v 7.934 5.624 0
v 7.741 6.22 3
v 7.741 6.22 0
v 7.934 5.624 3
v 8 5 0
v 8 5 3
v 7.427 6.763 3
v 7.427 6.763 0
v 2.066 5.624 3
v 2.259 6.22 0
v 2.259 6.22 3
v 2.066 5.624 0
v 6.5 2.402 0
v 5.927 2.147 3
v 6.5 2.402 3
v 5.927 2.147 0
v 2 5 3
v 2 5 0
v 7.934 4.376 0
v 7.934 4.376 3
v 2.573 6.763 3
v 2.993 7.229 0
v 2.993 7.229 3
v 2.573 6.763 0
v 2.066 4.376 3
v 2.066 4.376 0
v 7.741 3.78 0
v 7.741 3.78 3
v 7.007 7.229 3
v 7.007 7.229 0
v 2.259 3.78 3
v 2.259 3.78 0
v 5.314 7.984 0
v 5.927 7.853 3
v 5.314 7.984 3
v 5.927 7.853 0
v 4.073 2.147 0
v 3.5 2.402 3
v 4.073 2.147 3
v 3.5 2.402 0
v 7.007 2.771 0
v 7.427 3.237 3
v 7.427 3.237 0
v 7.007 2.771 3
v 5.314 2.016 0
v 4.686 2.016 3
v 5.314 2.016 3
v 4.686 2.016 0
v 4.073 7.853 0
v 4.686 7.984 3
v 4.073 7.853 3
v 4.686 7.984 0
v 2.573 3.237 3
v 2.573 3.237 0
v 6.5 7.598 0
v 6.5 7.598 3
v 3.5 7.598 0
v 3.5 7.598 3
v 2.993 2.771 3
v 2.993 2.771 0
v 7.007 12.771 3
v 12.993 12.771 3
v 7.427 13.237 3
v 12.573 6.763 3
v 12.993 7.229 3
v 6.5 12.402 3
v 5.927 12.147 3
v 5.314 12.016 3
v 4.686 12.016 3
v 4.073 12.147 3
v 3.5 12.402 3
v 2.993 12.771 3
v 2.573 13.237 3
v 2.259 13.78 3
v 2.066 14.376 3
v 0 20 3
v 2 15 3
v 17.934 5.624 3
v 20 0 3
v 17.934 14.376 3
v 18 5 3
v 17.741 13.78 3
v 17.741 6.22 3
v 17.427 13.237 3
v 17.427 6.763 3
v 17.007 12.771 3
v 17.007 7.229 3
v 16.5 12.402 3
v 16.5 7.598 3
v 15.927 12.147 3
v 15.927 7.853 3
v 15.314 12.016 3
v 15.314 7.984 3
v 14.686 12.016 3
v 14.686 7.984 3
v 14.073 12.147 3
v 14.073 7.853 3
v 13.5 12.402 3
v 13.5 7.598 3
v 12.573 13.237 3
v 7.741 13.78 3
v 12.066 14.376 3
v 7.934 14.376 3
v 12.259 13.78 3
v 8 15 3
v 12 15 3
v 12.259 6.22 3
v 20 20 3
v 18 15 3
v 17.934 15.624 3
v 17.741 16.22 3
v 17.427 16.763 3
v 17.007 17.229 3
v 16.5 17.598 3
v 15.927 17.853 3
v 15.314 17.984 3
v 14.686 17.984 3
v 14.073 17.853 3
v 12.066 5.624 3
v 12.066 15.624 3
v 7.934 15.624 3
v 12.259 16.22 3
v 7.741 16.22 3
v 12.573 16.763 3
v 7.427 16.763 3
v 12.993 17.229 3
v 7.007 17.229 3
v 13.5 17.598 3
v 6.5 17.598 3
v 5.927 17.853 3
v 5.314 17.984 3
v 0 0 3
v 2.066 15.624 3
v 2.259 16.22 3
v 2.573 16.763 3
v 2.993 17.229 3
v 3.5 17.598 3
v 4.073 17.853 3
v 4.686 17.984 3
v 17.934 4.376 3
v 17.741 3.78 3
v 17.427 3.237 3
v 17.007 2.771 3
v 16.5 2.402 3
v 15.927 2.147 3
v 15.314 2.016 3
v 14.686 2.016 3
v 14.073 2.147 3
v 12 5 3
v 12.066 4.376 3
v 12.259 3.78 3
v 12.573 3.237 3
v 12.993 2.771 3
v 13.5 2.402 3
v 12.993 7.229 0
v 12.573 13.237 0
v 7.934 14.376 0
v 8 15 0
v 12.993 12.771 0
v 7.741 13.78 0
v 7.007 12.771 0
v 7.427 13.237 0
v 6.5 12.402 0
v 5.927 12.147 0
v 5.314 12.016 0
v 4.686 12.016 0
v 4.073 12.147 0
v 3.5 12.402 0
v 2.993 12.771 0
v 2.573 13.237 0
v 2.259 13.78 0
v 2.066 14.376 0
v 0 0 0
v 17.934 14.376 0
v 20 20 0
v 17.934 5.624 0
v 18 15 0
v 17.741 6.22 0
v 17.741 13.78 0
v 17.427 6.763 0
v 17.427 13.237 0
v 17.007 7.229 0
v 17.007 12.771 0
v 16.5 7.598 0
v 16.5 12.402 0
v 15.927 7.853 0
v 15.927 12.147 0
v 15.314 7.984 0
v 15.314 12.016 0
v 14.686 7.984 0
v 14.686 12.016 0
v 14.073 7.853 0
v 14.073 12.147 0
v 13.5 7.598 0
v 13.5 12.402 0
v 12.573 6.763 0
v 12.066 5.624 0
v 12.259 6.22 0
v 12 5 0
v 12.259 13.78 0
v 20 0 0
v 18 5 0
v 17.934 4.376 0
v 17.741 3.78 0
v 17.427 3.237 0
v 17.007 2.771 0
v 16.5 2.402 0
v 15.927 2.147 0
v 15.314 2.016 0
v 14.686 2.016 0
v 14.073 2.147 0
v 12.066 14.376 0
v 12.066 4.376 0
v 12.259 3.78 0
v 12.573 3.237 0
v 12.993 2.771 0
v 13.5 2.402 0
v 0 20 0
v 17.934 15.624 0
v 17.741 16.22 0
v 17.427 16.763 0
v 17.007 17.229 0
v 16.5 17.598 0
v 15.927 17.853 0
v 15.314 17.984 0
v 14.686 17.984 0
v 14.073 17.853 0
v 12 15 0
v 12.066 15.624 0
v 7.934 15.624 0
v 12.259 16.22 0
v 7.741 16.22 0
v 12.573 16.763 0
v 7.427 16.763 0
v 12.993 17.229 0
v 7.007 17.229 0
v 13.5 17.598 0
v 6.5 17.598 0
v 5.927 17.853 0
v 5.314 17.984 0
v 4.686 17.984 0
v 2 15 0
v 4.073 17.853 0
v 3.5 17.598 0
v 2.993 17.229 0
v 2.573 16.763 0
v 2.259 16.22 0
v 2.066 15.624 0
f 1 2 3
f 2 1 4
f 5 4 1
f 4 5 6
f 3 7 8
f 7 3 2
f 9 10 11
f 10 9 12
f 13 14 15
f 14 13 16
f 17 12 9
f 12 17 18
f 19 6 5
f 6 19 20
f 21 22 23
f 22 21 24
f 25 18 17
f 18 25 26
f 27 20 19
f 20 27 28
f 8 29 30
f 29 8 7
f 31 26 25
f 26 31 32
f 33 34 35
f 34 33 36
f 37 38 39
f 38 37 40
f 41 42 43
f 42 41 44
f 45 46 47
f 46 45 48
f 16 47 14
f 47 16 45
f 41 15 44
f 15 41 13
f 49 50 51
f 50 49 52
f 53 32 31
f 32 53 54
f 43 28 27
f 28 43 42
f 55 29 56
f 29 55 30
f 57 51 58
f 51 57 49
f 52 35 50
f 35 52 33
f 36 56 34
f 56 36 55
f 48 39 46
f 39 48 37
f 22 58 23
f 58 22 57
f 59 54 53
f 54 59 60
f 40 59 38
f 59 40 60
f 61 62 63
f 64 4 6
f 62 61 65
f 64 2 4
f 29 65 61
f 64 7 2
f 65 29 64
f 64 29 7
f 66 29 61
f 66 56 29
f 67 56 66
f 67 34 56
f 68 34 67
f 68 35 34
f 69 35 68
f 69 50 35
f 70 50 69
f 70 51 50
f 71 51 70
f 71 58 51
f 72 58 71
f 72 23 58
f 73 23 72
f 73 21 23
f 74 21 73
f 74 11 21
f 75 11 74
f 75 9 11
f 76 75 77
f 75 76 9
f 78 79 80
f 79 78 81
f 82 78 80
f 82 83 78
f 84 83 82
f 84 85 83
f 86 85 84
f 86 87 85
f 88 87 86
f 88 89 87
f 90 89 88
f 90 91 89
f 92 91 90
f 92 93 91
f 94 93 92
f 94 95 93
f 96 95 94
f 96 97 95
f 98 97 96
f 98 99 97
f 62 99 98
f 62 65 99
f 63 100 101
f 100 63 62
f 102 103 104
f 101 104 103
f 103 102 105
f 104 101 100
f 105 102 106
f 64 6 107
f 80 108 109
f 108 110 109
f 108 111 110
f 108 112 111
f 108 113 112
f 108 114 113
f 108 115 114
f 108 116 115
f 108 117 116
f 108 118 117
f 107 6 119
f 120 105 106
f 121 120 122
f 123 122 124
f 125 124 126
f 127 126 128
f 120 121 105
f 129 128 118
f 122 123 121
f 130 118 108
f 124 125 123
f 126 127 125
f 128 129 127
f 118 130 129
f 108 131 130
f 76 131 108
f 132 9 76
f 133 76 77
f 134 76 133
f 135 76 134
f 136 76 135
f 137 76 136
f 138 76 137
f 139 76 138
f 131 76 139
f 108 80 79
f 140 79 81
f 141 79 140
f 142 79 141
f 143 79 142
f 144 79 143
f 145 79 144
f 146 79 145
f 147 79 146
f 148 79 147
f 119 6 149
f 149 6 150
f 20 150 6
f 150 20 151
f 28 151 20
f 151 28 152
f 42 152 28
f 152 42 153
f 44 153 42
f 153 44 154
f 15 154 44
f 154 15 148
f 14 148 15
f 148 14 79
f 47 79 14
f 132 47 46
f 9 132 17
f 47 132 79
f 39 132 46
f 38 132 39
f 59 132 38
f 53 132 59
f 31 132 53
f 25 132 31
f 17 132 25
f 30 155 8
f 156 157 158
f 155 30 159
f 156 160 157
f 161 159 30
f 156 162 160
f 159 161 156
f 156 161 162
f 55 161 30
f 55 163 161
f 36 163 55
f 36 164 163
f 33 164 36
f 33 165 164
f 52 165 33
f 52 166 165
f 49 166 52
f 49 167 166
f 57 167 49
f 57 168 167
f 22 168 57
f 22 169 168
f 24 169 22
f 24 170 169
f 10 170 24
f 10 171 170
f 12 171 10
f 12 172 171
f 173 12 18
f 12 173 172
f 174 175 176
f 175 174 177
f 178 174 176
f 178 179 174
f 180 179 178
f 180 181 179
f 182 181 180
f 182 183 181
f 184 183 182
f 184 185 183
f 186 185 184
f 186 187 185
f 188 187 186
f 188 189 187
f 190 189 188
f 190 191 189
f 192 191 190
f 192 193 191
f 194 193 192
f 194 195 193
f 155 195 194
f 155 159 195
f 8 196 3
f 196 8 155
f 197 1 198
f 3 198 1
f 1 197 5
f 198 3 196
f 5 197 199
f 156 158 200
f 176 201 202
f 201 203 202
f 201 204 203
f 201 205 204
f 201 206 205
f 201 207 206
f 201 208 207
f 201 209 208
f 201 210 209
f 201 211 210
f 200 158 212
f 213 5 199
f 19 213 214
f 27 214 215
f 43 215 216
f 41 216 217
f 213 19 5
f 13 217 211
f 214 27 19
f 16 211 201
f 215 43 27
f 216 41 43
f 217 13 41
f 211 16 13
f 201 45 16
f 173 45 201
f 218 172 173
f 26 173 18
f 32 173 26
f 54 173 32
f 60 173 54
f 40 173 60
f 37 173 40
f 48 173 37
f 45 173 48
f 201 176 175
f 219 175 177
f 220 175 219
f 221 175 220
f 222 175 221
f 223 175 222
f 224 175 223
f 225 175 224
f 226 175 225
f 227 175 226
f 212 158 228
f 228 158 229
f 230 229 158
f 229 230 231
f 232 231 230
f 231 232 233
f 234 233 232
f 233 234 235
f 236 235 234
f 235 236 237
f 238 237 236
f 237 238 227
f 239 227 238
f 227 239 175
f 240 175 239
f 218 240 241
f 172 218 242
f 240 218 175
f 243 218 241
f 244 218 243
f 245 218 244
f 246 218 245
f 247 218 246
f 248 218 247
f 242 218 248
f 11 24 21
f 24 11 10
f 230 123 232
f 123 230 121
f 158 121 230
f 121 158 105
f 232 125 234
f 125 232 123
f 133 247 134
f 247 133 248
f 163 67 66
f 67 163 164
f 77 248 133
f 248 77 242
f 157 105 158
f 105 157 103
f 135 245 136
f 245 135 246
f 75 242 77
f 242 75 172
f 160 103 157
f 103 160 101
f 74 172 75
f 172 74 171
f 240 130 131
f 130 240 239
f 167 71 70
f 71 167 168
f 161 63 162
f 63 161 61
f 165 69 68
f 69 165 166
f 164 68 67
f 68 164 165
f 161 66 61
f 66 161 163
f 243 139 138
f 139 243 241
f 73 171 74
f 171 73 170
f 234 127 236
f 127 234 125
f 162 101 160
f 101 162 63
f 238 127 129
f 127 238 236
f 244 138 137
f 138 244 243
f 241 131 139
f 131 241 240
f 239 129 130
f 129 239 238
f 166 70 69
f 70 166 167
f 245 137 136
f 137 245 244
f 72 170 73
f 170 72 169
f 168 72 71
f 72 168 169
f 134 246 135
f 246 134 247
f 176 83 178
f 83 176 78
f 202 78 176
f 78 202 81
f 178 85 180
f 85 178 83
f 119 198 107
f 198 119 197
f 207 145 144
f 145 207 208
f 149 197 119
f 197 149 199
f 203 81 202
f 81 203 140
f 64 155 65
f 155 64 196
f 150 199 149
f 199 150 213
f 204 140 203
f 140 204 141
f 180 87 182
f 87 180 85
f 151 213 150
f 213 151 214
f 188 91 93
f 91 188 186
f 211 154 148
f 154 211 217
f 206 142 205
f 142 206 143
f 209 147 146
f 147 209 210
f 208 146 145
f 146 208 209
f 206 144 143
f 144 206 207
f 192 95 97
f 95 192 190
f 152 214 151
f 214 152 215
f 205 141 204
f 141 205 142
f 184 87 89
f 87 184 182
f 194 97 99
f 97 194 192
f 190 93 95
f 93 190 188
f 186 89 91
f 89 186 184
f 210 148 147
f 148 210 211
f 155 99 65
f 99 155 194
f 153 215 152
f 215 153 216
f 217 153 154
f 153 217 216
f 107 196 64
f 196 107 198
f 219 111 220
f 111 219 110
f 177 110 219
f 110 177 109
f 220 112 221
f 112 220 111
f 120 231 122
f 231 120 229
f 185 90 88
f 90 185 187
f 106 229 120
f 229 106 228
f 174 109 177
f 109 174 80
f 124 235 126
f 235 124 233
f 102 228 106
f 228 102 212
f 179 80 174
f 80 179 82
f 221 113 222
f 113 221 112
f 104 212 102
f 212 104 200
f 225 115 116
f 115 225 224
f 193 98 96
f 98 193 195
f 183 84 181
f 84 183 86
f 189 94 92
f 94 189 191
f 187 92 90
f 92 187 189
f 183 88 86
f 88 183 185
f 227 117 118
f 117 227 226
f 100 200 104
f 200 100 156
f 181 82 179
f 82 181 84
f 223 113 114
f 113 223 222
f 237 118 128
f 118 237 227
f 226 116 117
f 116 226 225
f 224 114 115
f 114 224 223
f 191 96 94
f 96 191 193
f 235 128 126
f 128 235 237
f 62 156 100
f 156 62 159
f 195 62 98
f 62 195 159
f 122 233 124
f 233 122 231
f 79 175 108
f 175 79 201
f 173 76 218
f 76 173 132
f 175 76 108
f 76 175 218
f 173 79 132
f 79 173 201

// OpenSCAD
module vent_holes(height = 3) {
    difference() {
        cube([20, 20, height]);
        for (x = [5 : 10 : 15]) {
            for (y = [5 : 10 : 15]) {
                translate([x, y, 0])
                cylinder(h = height, r = 3, $fn = 30);
            }
        }
    }
}

vent_holes();
